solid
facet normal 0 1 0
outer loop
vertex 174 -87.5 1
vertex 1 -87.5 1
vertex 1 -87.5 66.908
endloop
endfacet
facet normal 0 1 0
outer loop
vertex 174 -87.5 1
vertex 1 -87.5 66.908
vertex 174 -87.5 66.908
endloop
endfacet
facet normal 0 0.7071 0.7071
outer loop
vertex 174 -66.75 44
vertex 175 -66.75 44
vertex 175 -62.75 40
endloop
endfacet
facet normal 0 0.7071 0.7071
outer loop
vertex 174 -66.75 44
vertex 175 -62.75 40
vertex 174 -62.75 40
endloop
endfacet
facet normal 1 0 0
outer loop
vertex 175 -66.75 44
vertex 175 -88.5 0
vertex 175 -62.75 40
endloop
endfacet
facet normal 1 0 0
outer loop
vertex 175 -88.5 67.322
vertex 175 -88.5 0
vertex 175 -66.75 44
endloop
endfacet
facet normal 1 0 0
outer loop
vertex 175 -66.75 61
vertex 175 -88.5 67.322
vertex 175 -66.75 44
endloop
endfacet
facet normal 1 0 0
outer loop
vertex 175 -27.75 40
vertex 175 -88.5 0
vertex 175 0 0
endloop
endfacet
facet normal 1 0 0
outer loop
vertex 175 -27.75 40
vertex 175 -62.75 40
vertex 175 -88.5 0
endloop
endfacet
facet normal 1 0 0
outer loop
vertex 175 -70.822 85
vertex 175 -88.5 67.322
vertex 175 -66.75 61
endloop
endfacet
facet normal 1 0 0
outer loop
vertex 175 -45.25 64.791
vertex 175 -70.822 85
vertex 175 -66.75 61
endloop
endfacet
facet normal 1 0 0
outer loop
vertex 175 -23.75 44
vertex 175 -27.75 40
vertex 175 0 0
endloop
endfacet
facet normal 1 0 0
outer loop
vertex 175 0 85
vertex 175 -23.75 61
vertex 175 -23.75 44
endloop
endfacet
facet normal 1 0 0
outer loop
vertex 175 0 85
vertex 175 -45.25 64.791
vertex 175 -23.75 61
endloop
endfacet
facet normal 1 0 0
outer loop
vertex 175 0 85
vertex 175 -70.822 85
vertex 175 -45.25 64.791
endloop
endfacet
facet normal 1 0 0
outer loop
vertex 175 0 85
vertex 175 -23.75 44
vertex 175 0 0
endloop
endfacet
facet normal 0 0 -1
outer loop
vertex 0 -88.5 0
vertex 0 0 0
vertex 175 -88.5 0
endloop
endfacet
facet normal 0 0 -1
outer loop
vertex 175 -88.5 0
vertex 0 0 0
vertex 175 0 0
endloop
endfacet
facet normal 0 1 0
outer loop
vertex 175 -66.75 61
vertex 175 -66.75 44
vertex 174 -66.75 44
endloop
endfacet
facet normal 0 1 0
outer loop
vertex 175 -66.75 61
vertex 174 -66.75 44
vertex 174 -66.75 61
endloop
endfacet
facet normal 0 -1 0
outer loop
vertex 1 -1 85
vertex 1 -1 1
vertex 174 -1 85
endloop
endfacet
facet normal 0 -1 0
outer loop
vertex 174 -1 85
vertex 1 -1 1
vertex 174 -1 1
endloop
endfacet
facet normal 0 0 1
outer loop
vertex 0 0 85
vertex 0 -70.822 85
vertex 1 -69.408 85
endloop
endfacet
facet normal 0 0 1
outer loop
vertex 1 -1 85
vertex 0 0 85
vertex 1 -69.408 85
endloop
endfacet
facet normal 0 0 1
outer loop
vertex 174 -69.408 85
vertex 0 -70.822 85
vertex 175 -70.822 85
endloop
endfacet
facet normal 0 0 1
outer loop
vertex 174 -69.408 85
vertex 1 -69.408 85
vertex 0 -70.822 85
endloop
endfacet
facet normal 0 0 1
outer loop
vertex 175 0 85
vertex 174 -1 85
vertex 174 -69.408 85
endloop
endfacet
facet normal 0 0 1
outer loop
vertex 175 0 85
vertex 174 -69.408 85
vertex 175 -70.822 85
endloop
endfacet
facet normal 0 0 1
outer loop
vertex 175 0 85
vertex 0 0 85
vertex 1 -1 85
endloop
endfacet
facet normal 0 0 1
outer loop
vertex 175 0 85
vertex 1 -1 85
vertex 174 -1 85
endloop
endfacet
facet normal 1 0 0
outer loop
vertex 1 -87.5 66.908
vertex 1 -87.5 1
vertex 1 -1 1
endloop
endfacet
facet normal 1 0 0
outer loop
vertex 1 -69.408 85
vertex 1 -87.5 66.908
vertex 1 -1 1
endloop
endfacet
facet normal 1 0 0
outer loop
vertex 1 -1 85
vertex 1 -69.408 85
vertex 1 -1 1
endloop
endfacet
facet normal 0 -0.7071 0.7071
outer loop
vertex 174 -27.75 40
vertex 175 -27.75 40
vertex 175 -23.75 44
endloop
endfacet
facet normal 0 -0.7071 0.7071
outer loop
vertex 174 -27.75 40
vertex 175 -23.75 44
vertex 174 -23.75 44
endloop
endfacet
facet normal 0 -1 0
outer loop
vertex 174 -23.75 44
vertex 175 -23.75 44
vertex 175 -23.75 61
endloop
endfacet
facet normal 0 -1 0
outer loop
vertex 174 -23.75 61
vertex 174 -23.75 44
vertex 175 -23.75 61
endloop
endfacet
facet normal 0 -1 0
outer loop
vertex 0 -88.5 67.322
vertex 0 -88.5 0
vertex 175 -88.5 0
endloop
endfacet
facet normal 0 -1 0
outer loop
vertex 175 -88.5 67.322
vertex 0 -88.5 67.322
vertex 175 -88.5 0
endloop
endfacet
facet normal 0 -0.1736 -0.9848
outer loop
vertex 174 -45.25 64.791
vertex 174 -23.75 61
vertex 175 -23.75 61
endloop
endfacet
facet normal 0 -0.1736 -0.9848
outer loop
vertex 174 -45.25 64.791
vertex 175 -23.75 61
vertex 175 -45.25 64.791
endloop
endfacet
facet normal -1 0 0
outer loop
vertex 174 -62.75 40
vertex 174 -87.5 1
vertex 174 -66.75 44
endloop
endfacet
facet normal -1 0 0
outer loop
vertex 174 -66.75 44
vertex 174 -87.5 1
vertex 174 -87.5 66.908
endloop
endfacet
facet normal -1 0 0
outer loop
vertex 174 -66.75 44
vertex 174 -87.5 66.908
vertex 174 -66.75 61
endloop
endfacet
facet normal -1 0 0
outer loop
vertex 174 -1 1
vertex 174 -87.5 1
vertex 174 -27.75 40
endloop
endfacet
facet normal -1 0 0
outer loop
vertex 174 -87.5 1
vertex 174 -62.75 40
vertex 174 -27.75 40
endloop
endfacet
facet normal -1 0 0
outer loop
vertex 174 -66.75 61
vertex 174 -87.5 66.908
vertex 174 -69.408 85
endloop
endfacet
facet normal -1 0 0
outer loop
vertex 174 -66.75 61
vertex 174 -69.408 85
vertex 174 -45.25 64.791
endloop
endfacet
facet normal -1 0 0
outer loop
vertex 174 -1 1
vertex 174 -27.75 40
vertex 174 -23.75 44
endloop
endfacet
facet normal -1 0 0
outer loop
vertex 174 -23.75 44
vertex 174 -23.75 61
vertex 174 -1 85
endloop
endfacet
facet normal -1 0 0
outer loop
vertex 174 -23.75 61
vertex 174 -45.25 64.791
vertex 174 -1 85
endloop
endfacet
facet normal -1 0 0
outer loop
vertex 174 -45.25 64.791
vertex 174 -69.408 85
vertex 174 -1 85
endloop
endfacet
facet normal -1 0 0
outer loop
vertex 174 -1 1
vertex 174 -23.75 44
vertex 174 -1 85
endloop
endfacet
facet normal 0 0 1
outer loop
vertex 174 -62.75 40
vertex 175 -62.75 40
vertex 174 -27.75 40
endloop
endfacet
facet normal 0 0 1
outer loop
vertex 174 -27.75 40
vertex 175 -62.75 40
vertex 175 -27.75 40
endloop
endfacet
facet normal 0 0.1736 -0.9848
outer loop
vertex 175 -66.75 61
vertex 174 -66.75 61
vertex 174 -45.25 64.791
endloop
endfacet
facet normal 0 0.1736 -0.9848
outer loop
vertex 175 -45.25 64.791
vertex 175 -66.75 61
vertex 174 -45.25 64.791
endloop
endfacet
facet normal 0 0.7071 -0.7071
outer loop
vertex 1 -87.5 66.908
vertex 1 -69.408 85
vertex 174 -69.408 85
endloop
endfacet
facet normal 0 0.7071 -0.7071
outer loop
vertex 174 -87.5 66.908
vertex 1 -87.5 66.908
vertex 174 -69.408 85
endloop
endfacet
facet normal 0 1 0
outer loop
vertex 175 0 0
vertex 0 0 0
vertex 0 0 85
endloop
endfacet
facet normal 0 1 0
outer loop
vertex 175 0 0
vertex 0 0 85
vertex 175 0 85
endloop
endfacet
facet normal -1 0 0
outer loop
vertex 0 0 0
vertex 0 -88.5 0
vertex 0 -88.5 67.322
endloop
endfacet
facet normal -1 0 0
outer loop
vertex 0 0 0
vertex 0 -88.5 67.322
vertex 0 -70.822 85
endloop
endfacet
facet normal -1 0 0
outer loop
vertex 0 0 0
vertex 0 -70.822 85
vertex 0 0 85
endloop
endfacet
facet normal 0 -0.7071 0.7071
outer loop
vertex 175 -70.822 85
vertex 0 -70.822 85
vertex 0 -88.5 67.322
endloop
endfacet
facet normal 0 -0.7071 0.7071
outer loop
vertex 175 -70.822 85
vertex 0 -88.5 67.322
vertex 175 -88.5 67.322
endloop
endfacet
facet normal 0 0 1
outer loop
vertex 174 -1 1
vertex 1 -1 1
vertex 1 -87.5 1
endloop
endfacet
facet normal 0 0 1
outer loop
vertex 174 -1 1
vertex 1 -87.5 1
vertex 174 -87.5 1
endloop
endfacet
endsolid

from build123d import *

# Parameters (mm, degrees)
F0_W        = 175
F0_H        = 88.5
F1_DEPTH    = 85
F2_SIZE     = 17.678
F3_T        = -1
F4_W        = 43
F4_H        = 25
F5_DEPTH    = 2
F6_T1_DEPTH = 1
F7_SIZE     = 4


# Not quite as in the source:
# - a fillet or chamfer that OpenCascade refuses, or shapes differently, is made with other operations: its cross-section is extruded or revolved along the edge and cut away or added


with BuildPart() as f1:
    # F0 (on Top) → F1 (new body)
    with BuildSketch(Plane.XY):
        with Locations((87.5, -44.25)):
            Rectangle(F0_W, F0_H)
    extrude(amount=F1_DEPTH)

    # F2
    f2_edges = [f1.edges().sort_by_distance(p)[0] for p in [
        (87.5, -88.5, 85),
    ]]
    chamfer(f2_edges, length=F2_SIZE)

    # F3
    f3_openings = [f1.faces().sort_by_distance(p)[0] for p in [
        (87.5, -35.411, 85),
    ]]
    offset(amount=F3_T, openings=f3_openings, kind=Kind.INTERSECTION)

    # F4 (on face) → F5 (cut)
    with BuildSketch(Plane.YZ.offset(175)):
        with Locations((-45.25, 52.5)):
            Rectangle(F4_W, F4_H)
    extrude(amount=-F5_DEPTH, mode=Mode.SUBTRACT)

    # F6: chamfer of 4 x 22.6851272785 on 2 edges, made by hand

    # F6_s2 → F6_t1 (join)
    with BuildSketch(Plane.YZ.offset(174)):
        Polygon((-66.75, 61), (-44.0648727215, 65), (-66.75, 65), align=None)
        Polygon((-23.75, 61), (-46.4351272785, 65), (-23.75, 65), align=None)
    extrude(amount=F6_T1_DEPTH)

    # F7
    f7_edges = [f1.edges().sort_by_distance(p)[0] for p in [
        (174.5, -66.75, 40),
        (174.5, -23.75, 40),
    ]]
    chamfer(f7_edges, length=F7_SIZE)


solid = f1.part
